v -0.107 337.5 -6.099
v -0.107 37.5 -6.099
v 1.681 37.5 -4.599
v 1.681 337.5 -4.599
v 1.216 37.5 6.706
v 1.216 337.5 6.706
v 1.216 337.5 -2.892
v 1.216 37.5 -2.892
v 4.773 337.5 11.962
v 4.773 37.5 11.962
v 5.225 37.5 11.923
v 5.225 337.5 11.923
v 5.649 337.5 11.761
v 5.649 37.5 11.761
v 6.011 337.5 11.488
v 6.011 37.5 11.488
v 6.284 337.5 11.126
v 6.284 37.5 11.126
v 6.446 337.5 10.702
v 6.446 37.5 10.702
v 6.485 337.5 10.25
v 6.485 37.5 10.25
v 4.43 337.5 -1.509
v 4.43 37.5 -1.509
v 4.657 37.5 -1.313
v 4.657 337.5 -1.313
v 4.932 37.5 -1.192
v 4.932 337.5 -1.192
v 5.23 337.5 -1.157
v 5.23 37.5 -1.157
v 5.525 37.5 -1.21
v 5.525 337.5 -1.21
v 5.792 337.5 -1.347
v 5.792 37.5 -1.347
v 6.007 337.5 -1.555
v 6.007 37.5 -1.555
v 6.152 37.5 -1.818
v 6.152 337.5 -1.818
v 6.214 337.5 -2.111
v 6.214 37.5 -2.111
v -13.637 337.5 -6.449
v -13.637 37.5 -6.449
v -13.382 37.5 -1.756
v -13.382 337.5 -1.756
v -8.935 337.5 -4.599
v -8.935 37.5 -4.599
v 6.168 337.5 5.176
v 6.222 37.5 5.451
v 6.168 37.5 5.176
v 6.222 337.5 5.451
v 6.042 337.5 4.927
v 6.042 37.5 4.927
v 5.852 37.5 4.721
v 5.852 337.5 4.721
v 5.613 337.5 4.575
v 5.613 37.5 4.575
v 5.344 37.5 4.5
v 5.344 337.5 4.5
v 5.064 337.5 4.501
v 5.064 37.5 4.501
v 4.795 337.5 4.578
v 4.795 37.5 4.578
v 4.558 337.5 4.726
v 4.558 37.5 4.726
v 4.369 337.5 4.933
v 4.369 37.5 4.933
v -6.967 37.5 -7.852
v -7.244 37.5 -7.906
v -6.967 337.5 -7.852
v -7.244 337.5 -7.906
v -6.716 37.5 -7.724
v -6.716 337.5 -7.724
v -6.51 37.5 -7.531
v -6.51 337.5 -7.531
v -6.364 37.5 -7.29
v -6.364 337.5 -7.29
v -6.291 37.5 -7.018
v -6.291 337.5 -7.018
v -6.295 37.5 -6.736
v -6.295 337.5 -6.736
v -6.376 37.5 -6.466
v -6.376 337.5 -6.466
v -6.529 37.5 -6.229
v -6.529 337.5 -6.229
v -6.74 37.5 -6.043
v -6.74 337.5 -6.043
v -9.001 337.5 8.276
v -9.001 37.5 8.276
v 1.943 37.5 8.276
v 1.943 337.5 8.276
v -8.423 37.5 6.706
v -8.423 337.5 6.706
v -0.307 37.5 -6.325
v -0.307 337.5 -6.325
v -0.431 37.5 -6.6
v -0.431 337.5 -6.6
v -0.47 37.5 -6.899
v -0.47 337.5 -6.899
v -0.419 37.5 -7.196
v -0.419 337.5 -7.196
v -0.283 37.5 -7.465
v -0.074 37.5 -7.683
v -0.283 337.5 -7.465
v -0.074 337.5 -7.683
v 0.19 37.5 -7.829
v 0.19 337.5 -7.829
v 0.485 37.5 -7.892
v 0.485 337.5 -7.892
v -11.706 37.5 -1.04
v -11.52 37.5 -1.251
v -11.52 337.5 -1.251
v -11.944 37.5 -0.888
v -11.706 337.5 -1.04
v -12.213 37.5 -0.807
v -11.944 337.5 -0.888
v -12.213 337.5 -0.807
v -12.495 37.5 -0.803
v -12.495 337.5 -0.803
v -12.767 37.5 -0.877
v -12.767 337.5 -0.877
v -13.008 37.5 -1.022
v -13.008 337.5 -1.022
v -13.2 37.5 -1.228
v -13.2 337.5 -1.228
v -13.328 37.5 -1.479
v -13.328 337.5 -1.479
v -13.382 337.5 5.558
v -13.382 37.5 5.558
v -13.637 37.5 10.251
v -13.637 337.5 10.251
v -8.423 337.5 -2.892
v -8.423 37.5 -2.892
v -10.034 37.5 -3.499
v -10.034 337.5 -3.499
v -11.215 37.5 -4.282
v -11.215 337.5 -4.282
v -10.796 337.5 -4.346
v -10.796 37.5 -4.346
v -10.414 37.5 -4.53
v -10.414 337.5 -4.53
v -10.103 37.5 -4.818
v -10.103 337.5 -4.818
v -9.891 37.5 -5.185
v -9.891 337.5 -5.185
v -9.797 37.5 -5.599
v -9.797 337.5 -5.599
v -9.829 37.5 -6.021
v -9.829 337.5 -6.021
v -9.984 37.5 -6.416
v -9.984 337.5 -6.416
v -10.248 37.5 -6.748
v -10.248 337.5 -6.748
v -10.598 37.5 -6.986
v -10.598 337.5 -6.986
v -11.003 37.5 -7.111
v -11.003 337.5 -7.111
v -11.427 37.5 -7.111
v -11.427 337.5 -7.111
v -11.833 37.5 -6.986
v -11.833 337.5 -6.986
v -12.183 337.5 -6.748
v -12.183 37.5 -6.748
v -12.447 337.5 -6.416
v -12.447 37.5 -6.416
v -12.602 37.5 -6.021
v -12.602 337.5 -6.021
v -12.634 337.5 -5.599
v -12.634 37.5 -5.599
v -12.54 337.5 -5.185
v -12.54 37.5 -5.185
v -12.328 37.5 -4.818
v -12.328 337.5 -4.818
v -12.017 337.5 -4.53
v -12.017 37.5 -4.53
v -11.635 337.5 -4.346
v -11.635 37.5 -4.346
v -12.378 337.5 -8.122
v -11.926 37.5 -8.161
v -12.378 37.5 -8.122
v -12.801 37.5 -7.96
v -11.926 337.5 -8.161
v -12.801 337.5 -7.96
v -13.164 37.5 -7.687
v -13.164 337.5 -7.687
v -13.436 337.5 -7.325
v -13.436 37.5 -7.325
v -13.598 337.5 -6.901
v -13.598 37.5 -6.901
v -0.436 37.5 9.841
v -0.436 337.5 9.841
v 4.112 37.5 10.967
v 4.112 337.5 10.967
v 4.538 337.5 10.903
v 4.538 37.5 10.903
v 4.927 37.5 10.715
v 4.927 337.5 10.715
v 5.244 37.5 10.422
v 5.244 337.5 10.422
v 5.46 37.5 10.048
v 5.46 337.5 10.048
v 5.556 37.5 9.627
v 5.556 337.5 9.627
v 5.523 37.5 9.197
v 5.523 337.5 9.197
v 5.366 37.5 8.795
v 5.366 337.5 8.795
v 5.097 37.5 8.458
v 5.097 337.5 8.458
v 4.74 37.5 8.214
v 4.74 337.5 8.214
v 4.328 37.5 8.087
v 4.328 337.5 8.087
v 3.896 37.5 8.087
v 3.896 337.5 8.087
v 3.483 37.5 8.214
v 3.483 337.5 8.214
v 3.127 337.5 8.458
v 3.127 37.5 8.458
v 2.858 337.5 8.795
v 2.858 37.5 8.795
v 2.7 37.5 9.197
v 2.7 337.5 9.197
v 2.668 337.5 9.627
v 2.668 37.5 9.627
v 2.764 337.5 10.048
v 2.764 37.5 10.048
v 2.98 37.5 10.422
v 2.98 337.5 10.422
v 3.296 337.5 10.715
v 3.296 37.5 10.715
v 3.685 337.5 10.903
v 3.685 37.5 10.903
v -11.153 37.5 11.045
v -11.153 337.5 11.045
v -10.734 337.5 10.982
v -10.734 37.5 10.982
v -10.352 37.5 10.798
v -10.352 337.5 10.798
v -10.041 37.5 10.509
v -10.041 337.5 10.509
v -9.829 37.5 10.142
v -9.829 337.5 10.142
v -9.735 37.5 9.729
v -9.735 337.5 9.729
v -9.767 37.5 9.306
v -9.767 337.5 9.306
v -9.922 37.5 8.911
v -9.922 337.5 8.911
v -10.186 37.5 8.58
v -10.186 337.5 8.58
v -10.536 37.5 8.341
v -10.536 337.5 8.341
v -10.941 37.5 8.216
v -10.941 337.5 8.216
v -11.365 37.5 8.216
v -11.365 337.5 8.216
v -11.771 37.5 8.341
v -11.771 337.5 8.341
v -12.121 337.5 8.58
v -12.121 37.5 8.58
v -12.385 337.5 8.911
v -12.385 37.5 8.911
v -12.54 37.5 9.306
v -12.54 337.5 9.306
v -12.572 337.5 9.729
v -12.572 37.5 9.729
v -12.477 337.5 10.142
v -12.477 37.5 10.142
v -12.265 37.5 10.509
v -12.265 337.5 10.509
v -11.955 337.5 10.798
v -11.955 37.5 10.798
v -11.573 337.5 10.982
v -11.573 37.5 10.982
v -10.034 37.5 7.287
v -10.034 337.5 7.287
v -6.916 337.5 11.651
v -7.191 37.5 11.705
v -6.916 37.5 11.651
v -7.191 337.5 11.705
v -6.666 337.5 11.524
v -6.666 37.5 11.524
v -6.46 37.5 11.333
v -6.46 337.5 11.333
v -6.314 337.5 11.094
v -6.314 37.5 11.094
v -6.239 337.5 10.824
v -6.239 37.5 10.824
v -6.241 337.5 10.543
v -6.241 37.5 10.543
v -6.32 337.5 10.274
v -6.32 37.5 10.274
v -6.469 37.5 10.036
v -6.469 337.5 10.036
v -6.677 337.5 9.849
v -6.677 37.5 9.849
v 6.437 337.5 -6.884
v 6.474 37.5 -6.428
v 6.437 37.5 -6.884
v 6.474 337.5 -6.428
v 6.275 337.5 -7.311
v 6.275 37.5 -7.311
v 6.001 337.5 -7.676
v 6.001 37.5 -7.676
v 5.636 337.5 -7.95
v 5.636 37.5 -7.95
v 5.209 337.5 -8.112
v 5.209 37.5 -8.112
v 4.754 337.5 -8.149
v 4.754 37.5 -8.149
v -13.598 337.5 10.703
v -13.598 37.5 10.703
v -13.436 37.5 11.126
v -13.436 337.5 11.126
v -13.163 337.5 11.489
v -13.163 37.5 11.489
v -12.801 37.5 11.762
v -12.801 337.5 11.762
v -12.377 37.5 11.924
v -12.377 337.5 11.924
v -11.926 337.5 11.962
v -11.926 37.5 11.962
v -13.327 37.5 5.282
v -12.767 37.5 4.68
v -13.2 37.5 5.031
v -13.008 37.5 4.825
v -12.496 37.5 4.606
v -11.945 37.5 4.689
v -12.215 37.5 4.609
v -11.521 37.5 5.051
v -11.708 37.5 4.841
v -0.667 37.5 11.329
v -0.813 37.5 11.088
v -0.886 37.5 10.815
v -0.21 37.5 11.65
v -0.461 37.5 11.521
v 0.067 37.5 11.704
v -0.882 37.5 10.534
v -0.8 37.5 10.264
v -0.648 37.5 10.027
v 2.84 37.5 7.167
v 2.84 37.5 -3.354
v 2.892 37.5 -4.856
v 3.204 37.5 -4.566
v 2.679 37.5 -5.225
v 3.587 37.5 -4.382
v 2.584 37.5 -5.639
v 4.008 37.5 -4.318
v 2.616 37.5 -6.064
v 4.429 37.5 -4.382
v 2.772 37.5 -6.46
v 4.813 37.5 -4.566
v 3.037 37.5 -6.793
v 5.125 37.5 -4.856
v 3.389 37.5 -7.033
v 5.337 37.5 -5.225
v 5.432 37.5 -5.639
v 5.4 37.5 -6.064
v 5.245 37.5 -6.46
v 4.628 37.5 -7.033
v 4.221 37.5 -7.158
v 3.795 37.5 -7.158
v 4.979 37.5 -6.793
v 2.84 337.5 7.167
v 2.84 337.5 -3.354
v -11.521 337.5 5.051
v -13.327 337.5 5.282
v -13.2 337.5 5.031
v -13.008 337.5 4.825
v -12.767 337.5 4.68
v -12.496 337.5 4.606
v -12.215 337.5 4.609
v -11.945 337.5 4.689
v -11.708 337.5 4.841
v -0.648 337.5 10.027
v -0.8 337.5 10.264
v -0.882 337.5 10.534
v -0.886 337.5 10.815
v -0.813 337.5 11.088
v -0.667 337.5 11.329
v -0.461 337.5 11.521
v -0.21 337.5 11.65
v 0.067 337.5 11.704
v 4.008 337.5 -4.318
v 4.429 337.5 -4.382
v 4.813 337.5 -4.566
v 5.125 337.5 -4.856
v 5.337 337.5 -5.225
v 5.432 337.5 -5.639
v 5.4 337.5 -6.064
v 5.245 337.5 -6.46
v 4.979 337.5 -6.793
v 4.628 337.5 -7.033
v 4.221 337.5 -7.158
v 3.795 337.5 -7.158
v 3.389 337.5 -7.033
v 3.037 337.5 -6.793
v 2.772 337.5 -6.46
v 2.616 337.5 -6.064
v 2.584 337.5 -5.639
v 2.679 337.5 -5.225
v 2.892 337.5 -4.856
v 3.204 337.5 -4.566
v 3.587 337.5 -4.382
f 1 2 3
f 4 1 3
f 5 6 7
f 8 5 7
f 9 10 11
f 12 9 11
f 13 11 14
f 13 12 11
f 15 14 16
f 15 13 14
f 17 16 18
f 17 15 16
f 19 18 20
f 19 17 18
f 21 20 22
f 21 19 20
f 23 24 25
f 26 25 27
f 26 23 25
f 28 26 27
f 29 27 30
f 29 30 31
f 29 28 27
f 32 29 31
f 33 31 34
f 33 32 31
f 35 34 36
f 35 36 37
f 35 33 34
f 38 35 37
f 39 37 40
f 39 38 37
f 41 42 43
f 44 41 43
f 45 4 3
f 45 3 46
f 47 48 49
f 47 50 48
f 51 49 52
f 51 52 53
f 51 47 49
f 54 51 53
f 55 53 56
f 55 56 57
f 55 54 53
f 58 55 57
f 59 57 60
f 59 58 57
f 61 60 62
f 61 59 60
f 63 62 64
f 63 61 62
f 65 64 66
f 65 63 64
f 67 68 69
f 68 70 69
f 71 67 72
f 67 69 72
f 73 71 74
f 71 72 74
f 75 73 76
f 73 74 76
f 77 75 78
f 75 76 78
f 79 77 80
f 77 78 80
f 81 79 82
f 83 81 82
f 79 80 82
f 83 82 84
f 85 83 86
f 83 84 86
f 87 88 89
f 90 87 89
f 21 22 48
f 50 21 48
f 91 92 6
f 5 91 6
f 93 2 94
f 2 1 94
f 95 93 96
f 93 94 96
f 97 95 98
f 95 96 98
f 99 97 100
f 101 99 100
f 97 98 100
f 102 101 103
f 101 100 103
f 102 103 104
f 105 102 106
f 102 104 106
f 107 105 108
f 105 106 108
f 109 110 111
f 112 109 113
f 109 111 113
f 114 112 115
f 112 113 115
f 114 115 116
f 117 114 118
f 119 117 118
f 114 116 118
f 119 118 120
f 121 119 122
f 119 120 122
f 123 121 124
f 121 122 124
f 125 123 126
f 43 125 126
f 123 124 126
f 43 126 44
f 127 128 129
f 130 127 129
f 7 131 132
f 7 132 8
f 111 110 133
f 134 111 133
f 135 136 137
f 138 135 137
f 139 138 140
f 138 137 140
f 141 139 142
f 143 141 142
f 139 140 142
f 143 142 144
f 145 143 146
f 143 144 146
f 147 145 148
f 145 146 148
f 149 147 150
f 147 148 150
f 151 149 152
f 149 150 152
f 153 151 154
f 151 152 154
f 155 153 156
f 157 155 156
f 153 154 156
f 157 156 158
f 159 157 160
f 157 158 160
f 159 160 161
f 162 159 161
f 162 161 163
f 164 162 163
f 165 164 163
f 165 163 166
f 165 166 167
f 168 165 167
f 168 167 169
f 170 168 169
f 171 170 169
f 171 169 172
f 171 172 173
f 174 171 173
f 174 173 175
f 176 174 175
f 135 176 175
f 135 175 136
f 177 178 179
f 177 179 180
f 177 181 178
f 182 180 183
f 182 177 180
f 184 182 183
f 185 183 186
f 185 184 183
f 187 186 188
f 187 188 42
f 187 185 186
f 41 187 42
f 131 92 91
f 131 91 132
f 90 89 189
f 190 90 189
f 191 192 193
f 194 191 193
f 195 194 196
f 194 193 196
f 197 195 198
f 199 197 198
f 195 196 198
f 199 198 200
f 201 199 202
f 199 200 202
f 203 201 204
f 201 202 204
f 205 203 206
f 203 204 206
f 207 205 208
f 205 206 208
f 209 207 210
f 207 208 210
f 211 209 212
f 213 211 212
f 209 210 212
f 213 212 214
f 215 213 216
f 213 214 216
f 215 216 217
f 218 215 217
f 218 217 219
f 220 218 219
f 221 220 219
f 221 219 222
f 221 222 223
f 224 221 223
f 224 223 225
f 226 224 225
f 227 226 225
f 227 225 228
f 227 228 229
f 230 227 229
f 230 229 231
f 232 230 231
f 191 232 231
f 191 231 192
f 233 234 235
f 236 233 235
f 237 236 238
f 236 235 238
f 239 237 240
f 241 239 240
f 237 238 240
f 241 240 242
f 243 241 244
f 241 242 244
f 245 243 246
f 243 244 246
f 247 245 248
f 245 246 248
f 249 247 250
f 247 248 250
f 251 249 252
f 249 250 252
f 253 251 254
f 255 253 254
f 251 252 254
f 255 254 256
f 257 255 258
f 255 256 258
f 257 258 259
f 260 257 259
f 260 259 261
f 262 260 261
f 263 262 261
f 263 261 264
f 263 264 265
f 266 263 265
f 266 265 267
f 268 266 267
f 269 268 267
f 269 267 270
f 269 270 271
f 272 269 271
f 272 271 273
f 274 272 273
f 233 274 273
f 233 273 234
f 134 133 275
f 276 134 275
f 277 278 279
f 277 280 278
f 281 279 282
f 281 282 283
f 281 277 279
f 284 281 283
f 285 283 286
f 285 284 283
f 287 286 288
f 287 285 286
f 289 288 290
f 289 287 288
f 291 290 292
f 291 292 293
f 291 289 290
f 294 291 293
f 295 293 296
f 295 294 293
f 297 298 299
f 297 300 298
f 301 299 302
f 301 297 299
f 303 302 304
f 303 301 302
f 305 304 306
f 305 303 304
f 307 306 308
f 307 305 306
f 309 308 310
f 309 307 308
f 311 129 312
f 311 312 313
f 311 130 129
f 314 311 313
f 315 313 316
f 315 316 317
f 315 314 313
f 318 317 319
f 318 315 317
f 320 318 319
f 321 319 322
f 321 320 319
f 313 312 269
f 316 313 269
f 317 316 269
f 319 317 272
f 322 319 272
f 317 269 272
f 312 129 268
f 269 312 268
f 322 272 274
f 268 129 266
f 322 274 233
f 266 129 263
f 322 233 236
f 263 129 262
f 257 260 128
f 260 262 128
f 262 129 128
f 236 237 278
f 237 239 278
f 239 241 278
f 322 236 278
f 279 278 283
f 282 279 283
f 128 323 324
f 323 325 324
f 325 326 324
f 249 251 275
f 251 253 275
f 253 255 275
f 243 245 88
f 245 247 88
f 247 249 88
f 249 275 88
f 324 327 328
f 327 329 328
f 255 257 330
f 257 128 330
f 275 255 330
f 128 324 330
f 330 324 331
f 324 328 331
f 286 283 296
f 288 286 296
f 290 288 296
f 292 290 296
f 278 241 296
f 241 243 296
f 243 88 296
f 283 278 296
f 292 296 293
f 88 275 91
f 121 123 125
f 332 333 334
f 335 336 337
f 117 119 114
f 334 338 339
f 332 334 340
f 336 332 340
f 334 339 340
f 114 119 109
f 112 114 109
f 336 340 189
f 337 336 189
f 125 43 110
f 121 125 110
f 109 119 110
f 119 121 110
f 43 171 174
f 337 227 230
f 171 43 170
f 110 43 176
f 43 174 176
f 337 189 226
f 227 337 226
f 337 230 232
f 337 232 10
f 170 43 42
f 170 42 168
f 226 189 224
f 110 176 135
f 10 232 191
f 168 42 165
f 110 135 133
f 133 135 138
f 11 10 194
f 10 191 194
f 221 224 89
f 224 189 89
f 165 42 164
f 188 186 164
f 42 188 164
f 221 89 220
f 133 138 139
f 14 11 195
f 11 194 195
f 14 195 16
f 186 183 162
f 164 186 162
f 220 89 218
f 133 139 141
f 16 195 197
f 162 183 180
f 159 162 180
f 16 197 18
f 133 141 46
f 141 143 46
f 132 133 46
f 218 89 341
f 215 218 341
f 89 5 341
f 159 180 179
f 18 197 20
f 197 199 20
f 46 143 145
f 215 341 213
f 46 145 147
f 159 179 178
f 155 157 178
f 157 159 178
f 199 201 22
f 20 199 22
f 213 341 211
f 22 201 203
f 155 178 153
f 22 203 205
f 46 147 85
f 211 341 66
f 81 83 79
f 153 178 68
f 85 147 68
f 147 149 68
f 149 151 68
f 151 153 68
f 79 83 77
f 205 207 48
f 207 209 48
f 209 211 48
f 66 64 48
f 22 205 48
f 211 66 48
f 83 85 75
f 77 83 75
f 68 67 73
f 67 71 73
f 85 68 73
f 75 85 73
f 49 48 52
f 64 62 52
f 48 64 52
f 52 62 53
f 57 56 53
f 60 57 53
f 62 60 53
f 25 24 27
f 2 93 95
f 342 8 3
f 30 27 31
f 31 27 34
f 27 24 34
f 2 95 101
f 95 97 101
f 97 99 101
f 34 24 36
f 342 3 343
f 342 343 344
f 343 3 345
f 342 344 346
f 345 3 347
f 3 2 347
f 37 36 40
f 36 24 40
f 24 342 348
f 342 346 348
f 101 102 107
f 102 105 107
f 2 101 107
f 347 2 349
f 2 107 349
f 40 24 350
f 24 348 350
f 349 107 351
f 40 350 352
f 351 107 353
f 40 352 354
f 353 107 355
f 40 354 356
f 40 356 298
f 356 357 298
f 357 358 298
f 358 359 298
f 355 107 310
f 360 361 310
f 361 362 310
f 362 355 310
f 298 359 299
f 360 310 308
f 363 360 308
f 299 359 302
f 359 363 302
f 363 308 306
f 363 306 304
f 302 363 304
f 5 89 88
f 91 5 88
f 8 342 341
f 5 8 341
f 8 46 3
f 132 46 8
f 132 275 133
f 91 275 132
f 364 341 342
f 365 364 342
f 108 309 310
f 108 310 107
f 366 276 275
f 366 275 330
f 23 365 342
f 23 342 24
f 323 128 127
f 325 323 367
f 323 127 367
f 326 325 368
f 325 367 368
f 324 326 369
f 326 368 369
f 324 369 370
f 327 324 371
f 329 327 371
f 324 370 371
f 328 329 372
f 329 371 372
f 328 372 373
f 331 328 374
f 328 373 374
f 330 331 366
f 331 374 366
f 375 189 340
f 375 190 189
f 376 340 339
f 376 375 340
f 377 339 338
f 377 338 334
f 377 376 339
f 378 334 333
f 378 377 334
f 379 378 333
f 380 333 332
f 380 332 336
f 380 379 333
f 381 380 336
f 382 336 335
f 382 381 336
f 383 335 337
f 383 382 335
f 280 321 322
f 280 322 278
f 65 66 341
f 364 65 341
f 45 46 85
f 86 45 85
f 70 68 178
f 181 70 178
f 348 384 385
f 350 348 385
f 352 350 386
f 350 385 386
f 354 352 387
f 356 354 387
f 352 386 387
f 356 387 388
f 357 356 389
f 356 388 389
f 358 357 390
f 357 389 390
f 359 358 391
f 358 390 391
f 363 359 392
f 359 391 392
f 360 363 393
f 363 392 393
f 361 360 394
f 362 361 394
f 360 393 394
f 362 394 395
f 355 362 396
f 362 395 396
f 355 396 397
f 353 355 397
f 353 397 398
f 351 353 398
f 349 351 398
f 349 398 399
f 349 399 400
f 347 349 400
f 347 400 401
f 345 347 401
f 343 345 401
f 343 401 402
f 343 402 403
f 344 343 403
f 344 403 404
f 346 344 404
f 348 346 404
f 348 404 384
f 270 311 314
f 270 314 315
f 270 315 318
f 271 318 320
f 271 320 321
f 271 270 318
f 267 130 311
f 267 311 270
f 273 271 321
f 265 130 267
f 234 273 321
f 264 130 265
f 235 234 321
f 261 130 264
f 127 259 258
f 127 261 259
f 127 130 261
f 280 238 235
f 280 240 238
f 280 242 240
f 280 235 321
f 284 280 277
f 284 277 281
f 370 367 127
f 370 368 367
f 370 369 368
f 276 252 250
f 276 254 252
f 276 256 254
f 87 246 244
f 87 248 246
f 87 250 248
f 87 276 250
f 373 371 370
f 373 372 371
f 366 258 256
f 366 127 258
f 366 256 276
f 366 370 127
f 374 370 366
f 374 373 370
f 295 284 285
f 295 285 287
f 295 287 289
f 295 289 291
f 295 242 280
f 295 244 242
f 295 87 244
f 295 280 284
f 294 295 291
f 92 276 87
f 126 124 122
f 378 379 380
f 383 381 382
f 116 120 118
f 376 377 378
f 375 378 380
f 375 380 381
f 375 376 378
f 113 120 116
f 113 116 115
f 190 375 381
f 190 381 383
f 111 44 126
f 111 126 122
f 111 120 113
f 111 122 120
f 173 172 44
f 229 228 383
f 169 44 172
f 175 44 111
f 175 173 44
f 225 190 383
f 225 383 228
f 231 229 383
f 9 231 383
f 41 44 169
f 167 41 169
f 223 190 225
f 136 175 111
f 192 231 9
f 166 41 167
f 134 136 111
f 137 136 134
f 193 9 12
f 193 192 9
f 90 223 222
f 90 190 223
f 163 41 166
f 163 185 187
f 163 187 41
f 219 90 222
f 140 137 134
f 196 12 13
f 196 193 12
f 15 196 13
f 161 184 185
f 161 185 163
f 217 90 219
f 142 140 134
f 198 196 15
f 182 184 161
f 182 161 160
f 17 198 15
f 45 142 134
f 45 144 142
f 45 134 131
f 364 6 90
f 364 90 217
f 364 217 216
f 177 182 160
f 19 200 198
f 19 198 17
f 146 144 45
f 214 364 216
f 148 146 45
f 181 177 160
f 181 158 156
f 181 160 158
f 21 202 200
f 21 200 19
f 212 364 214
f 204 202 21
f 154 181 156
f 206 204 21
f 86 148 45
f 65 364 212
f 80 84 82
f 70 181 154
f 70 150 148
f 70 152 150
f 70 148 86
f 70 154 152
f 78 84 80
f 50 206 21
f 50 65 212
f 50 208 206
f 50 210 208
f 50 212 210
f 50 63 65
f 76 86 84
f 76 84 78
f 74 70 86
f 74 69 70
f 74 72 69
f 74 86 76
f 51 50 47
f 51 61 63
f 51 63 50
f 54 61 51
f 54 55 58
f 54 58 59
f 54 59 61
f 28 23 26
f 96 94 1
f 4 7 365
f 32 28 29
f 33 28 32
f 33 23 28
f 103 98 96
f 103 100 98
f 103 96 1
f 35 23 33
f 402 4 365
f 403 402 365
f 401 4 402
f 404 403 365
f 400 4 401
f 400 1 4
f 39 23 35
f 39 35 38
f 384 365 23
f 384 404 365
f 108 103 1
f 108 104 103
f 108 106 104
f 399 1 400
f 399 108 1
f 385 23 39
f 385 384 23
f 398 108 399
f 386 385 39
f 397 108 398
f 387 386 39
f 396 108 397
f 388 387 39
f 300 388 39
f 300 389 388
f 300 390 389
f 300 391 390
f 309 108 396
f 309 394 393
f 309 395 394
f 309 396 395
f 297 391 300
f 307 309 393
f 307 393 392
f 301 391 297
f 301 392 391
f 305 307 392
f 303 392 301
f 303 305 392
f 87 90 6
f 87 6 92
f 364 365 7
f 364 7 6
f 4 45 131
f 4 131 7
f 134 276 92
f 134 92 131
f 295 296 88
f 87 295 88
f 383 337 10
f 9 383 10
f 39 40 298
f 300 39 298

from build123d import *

# Parameters (mm, degrees)
BOSS_EXTRUDE1_DEPTH = 375
FILLET1_R           = 2.032
FILLET2_R           = 1.27
SKETCH5_W           = 12.048677603
SKETCH5_H           = 11.996966541
SKETCH5_R           = 1.809887194
SKETCH5_R_2         = 1.778
SKETCH5_R_3         = 1.784780941
CUT_EXTRUDE3_DEPTH  = 376.626052464
SCALE1_SCALE        = 0.8


with BuildPart() as part:
    # Sketch2 → Boss-Extrude1 (new body)
    with BuildSketch(Plane(origin=(0, 0, 0), x_dir=(1, 0, 0), z_dir=(0, 1, 0))):
        Polygon((-11.631944508, 4.856112595), (-11.631944508, -8.62647921), (-15.607851567, -2.645315933), (-16.258611825, -14.593573265), (-4.310354494, -13.942813006), (-10.340832945, -9.861953178), (3.339587632, -9.861953178), (-2.854456203, -13.936328227), (9.141388175, -14.593573265), (8.484143137, -2.597728887), (4.461618468, -8.47589662), (4.461618468, 4.675168062), (8.490627916, 0), (9.141388175, 10.806426735), (-1.66503856, 10.155666477), (3.011955341, 6.231609797), (-10.257604353, 6.231609797), (-4.292081103, 10.155666477), (-16.258611825, 10.806426735), (-15.607851567, -1.160103987), align=None)
    extrude(amount=BOSS_EXTRUDE1_DEPTH)

    # Fillet1
    fillet1_edges = [part.edges().sort_by_distance(p)[0] for p in [
        (9.141388175, 187.5, 14.593573265),
        (-16.258611825, 187.5, 14.593573265),
        (-16.258611825, 187.5, -10.806426735),
        (9.141388175, 187.5, -10.806426735),
    ]]
    fillet(fillet1_edges, radius=FILLET1_R)

    # Fillet2
    fillet2_edges = [part.edges().sort_by_distance(p)[0] for p in [
        (8.490627916, 187.5, 0),
        (8.484143137, 187.5, 2.597728887),
        (-2.854456203, 187.5, 13.936328227),
        (-4.310354494, 187.5, 13.942813006),
        (-15.607851567, 187.5, 2.645315933),
        (-15.607851567, 187.5, 1.160103987),
        (-4.292081103, 187.5, -10.155666477),
        (-1.66503856, 187.5, -10.155666477),
    ]]
    fillet(fillet2_edges, radius=FILLET2_R)

    # Sketch5 → Cut-Extrude3 (cut, through all)
    with BuildSketch(Plane(origin=(0, 375, 0), x_dir=(1, 0, 0), z_dir=(0, 1, 0))):
        with Locations((-3.593458736, -1.901154881)):
            Rectangle(SKETCH5_W, SKETCH5_H)
        with Locations(Location((6.050654454, -11.415990413, 0), (0, 0, 270))):
            Circle(SKETCH5_R)
        with Locations(Location((-13.030727673, -11.545268069, 0), (0, 0, 270))):
            Circle(SKETCH5_R_2)
        with Locations(Location((-13.108294267, 7.613680652, 0), (0, 0, 270))):
            Circle(SKETCH5_R_2)
        with Locations(Location((5.921376797, 7.665391714, 0), (0, 0, 270))):
            Circle(SKETCH5_R_3)
    extrude(amount=-CUT_EXTRUDE3_DEPTH, mode=Mode.SUBTRACT)


with BuildPart() as part_1:
    # Scale1: scaled about (-3.644090286, 187.5, 1.930683285)
    add(part.part.scale(SCALE1_SCALE).moved(Location((-0.728818057, 37.5, 0.386136657))))


solid = part_1.part
